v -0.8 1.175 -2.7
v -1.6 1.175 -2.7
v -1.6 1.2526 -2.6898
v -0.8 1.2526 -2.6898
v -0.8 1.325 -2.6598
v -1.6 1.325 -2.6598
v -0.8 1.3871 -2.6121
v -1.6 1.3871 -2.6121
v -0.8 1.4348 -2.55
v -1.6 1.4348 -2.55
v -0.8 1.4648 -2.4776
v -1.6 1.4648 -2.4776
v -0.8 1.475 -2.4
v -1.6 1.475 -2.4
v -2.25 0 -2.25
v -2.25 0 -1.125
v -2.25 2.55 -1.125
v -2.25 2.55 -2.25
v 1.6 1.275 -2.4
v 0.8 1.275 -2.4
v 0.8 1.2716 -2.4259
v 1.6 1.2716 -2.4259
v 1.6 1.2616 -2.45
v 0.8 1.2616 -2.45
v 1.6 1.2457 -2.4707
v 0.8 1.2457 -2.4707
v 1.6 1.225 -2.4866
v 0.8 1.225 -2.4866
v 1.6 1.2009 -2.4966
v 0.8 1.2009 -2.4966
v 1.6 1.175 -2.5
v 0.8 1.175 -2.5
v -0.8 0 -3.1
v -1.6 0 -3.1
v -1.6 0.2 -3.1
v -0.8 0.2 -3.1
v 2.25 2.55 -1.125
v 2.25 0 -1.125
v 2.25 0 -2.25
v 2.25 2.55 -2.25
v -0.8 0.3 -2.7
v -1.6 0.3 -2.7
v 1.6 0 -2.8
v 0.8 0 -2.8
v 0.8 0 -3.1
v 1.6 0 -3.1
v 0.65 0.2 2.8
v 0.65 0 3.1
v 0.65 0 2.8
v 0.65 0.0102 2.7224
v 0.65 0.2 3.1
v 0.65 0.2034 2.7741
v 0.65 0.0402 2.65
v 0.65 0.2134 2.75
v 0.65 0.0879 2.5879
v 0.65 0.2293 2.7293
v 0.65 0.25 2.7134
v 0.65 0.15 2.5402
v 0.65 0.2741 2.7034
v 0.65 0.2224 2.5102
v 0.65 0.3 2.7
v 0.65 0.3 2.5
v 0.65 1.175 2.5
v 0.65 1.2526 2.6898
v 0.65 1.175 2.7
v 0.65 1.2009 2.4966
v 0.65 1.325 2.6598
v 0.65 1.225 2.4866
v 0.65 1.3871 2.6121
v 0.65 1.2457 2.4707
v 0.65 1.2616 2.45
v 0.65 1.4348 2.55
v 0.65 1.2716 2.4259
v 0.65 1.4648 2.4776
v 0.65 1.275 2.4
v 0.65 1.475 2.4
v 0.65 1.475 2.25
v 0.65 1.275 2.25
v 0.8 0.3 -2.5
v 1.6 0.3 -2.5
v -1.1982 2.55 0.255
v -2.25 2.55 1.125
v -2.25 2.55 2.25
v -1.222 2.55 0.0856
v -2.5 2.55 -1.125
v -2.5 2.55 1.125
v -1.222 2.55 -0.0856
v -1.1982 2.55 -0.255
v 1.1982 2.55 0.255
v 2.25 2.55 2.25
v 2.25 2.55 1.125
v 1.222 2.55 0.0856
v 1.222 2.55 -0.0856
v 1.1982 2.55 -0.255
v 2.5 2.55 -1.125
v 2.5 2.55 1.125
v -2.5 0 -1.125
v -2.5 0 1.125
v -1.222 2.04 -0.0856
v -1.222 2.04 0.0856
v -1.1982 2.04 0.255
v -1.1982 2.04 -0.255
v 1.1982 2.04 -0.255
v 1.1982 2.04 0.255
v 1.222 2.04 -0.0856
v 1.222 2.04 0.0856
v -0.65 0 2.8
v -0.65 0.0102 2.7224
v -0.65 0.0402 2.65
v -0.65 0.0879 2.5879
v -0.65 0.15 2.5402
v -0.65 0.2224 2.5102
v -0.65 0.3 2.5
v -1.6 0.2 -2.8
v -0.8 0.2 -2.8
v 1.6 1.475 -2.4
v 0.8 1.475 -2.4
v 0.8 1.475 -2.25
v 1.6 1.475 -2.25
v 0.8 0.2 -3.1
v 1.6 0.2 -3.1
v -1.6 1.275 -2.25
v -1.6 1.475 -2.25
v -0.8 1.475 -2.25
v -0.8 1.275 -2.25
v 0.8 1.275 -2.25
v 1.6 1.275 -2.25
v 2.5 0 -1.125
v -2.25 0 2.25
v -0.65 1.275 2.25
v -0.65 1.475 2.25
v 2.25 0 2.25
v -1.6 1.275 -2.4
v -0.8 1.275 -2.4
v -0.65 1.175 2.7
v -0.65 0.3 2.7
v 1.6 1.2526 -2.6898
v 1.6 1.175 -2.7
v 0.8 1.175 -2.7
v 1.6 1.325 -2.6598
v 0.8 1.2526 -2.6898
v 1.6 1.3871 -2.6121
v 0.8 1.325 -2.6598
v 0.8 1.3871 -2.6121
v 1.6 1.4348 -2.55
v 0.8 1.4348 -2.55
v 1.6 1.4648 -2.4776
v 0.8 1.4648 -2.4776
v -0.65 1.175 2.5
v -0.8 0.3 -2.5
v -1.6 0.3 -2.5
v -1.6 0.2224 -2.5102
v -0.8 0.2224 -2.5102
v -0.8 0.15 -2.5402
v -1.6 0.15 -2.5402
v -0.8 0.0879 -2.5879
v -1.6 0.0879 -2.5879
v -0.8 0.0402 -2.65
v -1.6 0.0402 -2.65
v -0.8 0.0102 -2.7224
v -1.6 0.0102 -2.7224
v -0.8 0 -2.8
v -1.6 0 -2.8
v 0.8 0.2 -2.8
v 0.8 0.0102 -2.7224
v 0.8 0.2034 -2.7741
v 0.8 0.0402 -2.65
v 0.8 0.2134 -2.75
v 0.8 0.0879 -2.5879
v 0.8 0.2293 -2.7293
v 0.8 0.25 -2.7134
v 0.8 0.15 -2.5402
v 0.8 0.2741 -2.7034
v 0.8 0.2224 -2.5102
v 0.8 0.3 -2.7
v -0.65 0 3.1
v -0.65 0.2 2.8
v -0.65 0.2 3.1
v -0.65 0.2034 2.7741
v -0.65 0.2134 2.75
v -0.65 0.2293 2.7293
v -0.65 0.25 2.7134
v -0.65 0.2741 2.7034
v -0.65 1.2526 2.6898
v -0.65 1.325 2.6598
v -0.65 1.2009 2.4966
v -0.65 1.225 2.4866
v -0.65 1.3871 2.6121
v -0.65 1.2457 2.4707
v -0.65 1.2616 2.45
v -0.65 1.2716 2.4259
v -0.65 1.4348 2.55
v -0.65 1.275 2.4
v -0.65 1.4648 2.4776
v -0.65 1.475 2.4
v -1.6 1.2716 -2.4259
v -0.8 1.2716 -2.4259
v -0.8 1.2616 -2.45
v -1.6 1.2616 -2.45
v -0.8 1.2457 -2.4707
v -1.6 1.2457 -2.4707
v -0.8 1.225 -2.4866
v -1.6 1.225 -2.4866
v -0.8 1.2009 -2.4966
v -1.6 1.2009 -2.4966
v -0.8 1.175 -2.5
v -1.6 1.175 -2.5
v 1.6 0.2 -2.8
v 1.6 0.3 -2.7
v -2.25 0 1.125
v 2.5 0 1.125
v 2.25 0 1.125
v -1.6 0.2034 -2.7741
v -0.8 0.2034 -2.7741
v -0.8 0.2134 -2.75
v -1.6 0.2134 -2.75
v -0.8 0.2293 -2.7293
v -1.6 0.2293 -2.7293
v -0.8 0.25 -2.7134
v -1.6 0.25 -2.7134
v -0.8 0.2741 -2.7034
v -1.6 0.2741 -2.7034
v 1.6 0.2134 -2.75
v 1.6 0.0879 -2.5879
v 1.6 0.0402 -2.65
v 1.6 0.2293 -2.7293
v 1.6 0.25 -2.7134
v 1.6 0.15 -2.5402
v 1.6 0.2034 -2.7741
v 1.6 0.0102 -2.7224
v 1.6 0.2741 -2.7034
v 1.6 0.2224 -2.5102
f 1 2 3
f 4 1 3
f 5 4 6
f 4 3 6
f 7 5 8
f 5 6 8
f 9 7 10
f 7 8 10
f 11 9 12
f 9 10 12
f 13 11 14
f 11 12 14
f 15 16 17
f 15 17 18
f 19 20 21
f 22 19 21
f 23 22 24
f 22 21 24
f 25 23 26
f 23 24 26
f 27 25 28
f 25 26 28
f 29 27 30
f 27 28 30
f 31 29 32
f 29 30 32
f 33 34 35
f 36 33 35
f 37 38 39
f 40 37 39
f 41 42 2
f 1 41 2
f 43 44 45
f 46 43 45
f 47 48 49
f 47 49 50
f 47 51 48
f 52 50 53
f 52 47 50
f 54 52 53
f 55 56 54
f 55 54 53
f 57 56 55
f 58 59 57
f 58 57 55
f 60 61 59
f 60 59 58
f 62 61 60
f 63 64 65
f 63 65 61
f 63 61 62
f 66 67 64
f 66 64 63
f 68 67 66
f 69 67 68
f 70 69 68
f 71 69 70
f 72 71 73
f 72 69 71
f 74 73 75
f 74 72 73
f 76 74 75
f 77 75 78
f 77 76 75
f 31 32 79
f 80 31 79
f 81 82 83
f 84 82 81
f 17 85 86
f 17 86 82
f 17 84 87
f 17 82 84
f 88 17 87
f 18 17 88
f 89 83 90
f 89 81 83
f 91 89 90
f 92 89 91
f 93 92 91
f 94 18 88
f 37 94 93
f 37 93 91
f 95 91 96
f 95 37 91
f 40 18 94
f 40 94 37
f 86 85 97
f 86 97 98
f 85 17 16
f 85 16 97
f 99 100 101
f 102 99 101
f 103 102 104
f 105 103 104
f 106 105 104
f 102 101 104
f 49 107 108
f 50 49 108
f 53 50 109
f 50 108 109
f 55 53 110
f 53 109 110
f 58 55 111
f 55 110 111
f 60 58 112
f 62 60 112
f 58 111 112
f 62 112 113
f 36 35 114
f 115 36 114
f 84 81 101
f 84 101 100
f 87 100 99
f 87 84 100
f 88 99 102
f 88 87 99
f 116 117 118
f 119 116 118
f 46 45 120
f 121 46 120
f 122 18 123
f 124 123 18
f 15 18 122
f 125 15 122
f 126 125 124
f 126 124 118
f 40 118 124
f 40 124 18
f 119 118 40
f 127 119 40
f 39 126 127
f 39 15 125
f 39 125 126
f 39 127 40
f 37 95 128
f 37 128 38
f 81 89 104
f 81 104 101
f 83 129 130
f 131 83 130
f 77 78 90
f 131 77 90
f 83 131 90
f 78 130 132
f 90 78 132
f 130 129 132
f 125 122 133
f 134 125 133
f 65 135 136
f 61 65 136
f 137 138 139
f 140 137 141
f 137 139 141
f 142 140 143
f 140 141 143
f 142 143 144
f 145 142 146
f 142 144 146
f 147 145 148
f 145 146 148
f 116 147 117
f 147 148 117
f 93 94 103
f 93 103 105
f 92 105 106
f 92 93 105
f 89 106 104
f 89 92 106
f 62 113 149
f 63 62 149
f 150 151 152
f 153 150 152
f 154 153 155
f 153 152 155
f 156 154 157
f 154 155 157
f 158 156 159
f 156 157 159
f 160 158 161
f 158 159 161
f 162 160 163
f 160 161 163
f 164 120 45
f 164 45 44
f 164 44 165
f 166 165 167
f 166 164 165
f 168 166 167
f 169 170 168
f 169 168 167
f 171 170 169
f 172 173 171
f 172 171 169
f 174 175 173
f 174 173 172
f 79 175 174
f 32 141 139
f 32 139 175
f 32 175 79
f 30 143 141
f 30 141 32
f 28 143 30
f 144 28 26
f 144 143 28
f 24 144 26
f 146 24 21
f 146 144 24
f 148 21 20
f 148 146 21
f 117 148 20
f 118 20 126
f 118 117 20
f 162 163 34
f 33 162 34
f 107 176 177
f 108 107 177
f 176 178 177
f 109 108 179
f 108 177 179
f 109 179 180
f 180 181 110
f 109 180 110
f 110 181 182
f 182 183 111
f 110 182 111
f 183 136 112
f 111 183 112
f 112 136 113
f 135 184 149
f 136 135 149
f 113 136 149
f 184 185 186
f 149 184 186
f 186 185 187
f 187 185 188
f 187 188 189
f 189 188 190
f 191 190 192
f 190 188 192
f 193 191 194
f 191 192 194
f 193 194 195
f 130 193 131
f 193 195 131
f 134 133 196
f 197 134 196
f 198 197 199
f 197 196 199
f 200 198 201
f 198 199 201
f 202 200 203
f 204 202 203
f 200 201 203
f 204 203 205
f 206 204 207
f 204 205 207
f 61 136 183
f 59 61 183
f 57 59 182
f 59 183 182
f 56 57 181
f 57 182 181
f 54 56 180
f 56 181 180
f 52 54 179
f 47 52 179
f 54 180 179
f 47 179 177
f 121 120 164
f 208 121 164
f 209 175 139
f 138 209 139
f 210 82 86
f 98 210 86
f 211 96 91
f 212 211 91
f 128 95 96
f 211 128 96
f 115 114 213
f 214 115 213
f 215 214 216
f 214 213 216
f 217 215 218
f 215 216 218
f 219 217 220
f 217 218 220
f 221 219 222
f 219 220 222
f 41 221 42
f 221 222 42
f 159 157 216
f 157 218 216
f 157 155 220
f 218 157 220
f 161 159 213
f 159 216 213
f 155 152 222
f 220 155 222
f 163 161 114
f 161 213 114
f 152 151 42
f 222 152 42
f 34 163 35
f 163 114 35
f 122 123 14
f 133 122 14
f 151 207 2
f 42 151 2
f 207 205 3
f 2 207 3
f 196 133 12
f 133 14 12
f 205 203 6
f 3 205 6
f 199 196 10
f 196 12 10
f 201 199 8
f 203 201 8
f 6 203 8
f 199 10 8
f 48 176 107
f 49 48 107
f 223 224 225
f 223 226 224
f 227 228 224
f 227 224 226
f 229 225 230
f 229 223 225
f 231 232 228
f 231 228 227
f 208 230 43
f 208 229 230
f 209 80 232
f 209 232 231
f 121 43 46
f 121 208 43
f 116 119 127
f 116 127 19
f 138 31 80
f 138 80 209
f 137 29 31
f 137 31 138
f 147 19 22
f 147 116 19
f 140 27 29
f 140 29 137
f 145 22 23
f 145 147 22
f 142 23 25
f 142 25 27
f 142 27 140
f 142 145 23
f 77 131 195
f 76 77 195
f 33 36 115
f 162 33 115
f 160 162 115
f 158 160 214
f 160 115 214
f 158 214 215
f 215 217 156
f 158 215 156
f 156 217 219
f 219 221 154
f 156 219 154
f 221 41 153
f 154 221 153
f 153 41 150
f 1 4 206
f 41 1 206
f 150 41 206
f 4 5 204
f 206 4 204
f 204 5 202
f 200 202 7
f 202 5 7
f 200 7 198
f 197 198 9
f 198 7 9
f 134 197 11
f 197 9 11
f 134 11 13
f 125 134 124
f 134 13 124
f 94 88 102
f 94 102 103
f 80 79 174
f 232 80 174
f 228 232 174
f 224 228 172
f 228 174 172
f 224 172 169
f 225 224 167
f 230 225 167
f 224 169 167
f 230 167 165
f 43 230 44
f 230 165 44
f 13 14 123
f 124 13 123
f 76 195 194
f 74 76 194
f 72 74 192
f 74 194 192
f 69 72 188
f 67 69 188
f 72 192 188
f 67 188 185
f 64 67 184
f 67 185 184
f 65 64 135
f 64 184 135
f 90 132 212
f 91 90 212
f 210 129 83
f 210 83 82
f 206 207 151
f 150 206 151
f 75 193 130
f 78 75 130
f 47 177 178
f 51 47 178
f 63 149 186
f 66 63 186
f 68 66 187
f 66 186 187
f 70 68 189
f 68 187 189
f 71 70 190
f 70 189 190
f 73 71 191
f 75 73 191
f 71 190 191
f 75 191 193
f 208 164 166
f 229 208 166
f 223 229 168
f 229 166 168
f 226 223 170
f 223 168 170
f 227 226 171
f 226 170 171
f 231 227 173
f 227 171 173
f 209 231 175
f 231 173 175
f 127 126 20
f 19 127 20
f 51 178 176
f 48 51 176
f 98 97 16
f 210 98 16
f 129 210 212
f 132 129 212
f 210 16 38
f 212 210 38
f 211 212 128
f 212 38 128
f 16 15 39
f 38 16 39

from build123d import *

# Parameters (mm, degrees)
SKETCH1_W                                      = 4.5
SKETCH1_H                                      = 4.5
BASE_EXTRUDE_DEPTH                             = 2.55
SKETCH2_W                                      = 0.25
SKETCH2_H                                      = 2.25
EARS_EXTRUDE1_DEPTH                            = 2.55
DOUBLE_START                                   = -1.6
DOUBLE_FEET_EXTRUDE_THIN1_DEPTH                = 3.2
SINGLE_START                                   = -0.65
SINGLE_FOOT_EXTRUDE_THIN2_DEPTH                = 1.3
SKETCH5_W                                      = 1.6
SKETCH5_H                                      = 0.85
REMOVE_MIDDLE_OF_THE_DOUBLE_PINS_EXTRUDE_DEPTH = 5.728900506
SCREW_DRIVER_SLOT_EXTRUDE2_DEPTH               = 0.51


# Read off the part's stored shape, not the designer's step: double feet-Extrude-Thin1, single foot-Extrude-Thin2
with BuildPart() as part:
    # Sketch1 → Base-Extrude (new body)
    with BuildSketch(Plane(origin=(0, 0, 0), x_dir=(1, 0, 0), z_dir=(0, 1, 0))):
        Rectangle(SKETCH1_W, SKETCH1_H)
    extrude(amount=BASE_EXTRUDE_DEPTH)

    # Sketch2 → ears-Extrude1 (add, through all)
    with BuildSketch(Plane(origin=(0, 2.55, 0), x_dir=(-1, 0, 0), z_dir=(0, 1, 0))):
        with Locations((-2.375, 0)):
            Rectangle(SKETCH2_W, SKETCH2_H)
        with Locations((2.375, 0)):
            Rectangle(SKETCH2_W, SKETCH2_H)
    extrude(amount=-EARS_EXTRUDE1_DEPTH)

    # double feet-Extrude-Thin1 outline → double feet-Extrude-Thin1 (add)
    with BuildSketch(Plane(origin=(0, 0, 0), x_dir=(0, 0, -1), z_dir=(1, 0, 0)).offset(DOUBLE_START)):
        with BuildLine():
            ThreePointArc((2.5, 0.3), (2.587867966, 0.087867966), (2.8, 0))
            Line((2.8, 0), (3.1, 0))
            Line((3.1, 0), (3.1, 0.2))
            Line((3.1, 0.2), (2.8, 0.2))
            ThreePointArc((2.8, 0.2), (2.729289322, 0.229289322), (2.7, 0.3))
            Line((2.7, 0.3), (2.7, 1.175))
            ThreePointArc((2.7, 1.175), (2.612132034, 1.387132034), (2.4, 1.475))
            Line((2.4, 1.475), (2.25, 1.475))
            Line((2.25, 1.475), (2.25, 1.275))
            Line((2.25, 1.275), (2.4, 1.275))
            ThreePointArc((2.4, 1.275), (2.470710678, 1.245710678), (2.5, 1.175))
            Line((2.5, 1.175), (2.5, 0.3))
        make_face()
    extrude(amount=DOUBLE_FEET_EXTRUDE_THIN1_DEPTH)

    # single foot-Extrude-Thin2 outline → single foot-Extrude-Thin2 (add)
    with BuildSketch(Plane(origin=(0, 0, 0), x_dir=(0, 0, -1), z_dir=(1, 0, 0)).offset(SINGLE_START)):
        with BuildLine():
            Line((-3.1, 0), (-2.8, 0))
            ThreePointArc((-2.8, 0), (-2.587867966, 0.087867966), (-2.5, 0.3))
            Line((-2.5, 0.3), (-2.5, 1.175))
            ThreePointArc((-2.5, 1.175), (-2.470710678, 1.245710678), (-2.4, 1.275))
            Line((-2.4, 1.275), (-2.25, 1.275))
            Line((-2.25, 1.275), (-2.25, 1.475))
            Line((-2.25, 1.475), (-2.4, 1.475))
            ThreePointArc((-2.4, 1.475), (-2.612132034, 1.387132034), (-2.7, 1.175))
            Line((-2.7, 1.175), (-2.7, 0.3))
            ThreePointArc((-2.7, 0.3), (-2.729289322, 0.229289322), (-2.8, 0.2))
            Line((-2.8, 0.2), (-3.1, 0.2))
            Line((-3.1, 0.2), (-3.1, 0))
        make_face()
    extrude(amount=SINGLE_FOOT_EXTRUDE_THIN2_DEPTH)

    # Sketch5 → remove middle of the double pins-Extrude1 (cut, through all)
    with BuildSketch(Plane(origin=(0, 2.55, 0), x_dir=(-1, 0, 0), z_dir=(0, 1, 0))):
        with Locations((0, -2.675)):
            Rectangle(SKETCH5_W, SKETCH5_H)
    extrude(amount=-REMOVE_MIDDLE_OF_THE_DOUBLE_PINS_EXTRUDE_DEPTH, mode=Mode.SUBTRACT)

    # Sketch7 → screw driver slot-Extrude2 (cut)
    with BuildSketch(Plane(origin=(0, 2.55, 0), x_dir=(-1, 0, 0), z_dir=(0, 1, 0))):
        with BuildLine():
            Line((-1.198165264, 0.255), (1.198165264, 0.255))
            ThreePointArc((1.198165264, 0.255), (1.225, 0), (1.198165264, -0.255))
            Line((1.198165264, -0.255), (-1.198165264, -0.255))
            ThreePointArc((-1.198165264, -0.255), (-1.225, 0), (-1.198165264, 0.255))
        make_face()
    extrude(amount=-SCREW_DRIVER_SLOT_EXTRUDE2_DEPTH, mode=Mode.SUBTRACT)


solid = part.part
